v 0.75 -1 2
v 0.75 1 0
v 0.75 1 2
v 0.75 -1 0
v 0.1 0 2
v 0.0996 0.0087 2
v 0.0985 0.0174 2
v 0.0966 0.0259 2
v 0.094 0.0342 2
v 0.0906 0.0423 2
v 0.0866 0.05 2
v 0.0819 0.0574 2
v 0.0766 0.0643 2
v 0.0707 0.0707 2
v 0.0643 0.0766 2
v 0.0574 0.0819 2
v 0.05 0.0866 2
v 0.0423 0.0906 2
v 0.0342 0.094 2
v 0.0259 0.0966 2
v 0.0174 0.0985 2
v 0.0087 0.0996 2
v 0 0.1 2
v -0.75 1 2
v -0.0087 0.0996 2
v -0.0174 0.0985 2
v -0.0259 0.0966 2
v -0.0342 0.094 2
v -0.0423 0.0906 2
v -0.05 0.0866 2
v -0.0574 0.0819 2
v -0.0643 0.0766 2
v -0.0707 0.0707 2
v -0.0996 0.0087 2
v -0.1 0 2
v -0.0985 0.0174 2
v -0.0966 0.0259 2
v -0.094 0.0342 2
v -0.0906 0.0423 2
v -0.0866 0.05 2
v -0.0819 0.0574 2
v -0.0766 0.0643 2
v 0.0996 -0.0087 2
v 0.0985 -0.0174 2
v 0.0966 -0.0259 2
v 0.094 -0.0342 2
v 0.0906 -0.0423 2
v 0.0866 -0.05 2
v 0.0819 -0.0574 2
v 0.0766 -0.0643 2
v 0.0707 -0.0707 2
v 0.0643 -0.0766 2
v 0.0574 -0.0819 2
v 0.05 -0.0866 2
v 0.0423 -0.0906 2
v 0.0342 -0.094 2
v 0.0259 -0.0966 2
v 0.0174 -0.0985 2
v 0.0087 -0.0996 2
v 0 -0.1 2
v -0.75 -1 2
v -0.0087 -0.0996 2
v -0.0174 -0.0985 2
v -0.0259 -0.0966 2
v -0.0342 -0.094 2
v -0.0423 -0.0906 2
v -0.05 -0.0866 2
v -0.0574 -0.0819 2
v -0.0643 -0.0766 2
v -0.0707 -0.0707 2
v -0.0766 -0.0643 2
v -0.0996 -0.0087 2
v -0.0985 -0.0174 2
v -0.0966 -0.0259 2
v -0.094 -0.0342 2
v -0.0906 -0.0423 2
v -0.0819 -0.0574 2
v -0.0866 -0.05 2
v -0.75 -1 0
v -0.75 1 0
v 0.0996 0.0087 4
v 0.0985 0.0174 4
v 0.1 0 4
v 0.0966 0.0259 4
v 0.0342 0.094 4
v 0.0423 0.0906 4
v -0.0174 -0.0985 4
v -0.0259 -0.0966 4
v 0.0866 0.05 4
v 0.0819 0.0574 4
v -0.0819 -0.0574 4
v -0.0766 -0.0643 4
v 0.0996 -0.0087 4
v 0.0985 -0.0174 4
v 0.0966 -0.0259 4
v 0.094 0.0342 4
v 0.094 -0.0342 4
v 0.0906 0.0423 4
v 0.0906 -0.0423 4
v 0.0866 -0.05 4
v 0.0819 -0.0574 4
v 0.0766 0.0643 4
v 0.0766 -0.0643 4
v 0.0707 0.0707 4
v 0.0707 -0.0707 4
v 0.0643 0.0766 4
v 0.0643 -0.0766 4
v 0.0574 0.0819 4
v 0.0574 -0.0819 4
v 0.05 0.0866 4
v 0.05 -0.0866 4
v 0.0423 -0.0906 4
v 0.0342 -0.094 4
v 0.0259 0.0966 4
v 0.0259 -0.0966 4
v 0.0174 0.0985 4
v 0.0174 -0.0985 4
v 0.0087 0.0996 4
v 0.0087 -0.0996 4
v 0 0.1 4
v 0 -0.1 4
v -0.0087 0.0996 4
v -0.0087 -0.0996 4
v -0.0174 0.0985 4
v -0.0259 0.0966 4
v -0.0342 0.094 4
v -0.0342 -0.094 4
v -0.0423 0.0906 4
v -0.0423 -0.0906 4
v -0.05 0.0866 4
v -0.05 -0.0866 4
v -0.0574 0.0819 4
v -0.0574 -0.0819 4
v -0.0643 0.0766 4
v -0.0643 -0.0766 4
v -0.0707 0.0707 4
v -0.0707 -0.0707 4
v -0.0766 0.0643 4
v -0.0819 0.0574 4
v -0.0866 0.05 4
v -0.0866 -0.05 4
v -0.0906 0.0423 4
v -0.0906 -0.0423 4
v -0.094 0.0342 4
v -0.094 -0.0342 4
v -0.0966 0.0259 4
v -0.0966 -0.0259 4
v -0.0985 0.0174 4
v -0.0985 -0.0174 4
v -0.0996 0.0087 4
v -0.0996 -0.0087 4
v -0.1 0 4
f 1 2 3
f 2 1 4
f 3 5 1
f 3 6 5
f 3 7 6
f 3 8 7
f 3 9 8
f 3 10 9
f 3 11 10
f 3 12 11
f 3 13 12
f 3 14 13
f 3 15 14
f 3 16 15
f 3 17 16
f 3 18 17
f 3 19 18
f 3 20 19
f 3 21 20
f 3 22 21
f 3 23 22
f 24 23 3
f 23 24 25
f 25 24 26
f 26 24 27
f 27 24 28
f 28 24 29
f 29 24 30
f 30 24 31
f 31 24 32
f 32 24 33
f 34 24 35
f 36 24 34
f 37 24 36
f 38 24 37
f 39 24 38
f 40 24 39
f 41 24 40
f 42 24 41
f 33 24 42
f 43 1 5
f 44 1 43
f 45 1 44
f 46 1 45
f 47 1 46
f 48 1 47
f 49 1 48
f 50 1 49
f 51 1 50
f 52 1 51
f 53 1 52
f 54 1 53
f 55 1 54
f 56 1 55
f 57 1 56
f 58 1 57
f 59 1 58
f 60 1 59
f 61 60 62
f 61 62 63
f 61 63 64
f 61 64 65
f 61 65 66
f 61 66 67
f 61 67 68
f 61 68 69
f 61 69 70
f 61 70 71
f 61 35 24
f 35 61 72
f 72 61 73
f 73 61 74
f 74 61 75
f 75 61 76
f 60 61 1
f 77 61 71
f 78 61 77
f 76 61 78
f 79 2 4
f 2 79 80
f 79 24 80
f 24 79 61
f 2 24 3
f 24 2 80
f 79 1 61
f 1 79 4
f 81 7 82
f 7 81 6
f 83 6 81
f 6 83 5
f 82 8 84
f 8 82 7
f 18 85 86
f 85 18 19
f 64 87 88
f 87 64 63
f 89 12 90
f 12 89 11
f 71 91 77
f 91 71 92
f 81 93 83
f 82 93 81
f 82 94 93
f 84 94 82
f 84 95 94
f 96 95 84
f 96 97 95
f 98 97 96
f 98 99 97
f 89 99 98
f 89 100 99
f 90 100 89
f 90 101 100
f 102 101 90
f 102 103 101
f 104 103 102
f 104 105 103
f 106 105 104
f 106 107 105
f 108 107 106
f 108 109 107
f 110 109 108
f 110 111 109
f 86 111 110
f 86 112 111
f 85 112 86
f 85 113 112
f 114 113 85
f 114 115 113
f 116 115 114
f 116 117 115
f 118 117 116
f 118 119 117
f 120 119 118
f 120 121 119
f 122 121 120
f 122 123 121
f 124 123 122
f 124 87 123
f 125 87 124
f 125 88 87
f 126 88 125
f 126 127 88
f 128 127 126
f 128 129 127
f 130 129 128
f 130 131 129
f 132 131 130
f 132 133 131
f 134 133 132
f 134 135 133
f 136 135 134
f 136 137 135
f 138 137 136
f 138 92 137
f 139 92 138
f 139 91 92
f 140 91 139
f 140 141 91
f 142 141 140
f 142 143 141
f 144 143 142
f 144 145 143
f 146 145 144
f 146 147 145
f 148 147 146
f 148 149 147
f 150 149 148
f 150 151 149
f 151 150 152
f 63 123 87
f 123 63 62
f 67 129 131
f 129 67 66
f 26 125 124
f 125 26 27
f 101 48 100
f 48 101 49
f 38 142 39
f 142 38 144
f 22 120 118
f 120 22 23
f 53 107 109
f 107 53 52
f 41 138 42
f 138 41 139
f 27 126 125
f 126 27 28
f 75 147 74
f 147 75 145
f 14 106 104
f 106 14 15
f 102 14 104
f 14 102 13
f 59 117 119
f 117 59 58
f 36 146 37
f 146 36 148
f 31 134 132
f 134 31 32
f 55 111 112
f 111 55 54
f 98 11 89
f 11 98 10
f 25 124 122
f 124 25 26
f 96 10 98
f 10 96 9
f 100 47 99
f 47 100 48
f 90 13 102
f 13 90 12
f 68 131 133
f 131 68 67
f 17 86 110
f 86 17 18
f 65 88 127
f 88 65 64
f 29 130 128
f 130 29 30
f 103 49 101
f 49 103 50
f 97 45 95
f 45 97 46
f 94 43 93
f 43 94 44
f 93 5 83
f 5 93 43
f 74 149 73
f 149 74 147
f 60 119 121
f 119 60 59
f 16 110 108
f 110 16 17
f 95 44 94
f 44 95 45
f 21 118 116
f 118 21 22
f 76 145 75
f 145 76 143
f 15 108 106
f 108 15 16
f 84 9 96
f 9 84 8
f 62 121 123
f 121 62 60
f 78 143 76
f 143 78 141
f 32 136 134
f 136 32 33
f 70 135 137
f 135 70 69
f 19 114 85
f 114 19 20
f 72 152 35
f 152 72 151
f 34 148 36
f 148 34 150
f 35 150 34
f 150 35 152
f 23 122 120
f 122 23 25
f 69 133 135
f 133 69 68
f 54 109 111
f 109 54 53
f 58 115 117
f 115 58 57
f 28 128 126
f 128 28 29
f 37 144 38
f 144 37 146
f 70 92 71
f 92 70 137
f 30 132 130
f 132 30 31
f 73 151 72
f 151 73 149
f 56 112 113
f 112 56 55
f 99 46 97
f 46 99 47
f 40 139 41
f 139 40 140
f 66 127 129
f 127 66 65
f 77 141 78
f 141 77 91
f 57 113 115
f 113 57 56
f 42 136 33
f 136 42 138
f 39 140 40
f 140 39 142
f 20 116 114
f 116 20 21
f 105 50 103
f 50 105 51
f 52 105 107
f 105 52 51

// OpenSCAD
// file: lib.scad
function x(v) = v[0];
function y(v) = v[1];
function z(v) = v[2];
function add(v1,v2) = [ for (i = [ 0 : len(v1)-1 ]) v1[i] + v2[i] ];
function xv(d) = [d,0,0];
function yv(d) = [0,d,0];
function zv(d) = [0,0,d];

module box(v) { cube(size=v, center=true); }
module cyl(r1,r2,h) { cylinder(r1=r1, r2=r2, h=h, center=true); }

function grow(n,v) = [x(v)+n*2, y(v)+n*2, z(v)+n*2];

module rbox(v, radius=1) {
	cx = x(v)/2-radius;
	cy = y(v)/2-radius;
	cz = z(v)/2-radius;

	hull() {
		translate([cx,cy,cz]) sphere(r=radius);
		translate([cx,cy,-cz]) sphere(r=radius);
		translate([cx,-cy,cz]) sphere(r=radius);
		translate([cx,-cy,-cz]) sphere(r=radius);
		translate([-cx,cy,cz]) sphere(r=radius);
		translate([-cx,cy,-cz]) sphere(r=radius);
		translate([-cx,-cy,cz]) sphere(r=radius);
		translate([-cx,-cy,-cz]) sphere(r=radius);
	}
}

module fillet(r=1) {
  minkowski() {
    difference() {
      children();
      minkowski() {
        difference() {
          minkowski() {
            children();
            sphere(r=r);
          }
          children();
        }
        sphere(r=r);
      }
    }
    sphere(r=r);
  }
}
// main file
use <lib.scad>

module mast() {
	union() {
		translate([0,0,5.0]) cyl(0.25, 0.25, 10.0);
		translate([0,0,10.0]) box([4.0, 0.1, 0.1]);
	}
}

module bucket() {
	translate([0,0,1]) union() {
		box([1.5,2,2]);
		translate([0,0,1.5]) cyl(0.1,0.1,3.0);
	}
}

module terminusBase() {
	translate([0,0,1]) box([5,5,2]);
}

module towerBase() {
	translate([0,0,1]) box([3,3,2]);
}

//mast($fn=72);
//mast($fn=12);
bucket($fn=72);
